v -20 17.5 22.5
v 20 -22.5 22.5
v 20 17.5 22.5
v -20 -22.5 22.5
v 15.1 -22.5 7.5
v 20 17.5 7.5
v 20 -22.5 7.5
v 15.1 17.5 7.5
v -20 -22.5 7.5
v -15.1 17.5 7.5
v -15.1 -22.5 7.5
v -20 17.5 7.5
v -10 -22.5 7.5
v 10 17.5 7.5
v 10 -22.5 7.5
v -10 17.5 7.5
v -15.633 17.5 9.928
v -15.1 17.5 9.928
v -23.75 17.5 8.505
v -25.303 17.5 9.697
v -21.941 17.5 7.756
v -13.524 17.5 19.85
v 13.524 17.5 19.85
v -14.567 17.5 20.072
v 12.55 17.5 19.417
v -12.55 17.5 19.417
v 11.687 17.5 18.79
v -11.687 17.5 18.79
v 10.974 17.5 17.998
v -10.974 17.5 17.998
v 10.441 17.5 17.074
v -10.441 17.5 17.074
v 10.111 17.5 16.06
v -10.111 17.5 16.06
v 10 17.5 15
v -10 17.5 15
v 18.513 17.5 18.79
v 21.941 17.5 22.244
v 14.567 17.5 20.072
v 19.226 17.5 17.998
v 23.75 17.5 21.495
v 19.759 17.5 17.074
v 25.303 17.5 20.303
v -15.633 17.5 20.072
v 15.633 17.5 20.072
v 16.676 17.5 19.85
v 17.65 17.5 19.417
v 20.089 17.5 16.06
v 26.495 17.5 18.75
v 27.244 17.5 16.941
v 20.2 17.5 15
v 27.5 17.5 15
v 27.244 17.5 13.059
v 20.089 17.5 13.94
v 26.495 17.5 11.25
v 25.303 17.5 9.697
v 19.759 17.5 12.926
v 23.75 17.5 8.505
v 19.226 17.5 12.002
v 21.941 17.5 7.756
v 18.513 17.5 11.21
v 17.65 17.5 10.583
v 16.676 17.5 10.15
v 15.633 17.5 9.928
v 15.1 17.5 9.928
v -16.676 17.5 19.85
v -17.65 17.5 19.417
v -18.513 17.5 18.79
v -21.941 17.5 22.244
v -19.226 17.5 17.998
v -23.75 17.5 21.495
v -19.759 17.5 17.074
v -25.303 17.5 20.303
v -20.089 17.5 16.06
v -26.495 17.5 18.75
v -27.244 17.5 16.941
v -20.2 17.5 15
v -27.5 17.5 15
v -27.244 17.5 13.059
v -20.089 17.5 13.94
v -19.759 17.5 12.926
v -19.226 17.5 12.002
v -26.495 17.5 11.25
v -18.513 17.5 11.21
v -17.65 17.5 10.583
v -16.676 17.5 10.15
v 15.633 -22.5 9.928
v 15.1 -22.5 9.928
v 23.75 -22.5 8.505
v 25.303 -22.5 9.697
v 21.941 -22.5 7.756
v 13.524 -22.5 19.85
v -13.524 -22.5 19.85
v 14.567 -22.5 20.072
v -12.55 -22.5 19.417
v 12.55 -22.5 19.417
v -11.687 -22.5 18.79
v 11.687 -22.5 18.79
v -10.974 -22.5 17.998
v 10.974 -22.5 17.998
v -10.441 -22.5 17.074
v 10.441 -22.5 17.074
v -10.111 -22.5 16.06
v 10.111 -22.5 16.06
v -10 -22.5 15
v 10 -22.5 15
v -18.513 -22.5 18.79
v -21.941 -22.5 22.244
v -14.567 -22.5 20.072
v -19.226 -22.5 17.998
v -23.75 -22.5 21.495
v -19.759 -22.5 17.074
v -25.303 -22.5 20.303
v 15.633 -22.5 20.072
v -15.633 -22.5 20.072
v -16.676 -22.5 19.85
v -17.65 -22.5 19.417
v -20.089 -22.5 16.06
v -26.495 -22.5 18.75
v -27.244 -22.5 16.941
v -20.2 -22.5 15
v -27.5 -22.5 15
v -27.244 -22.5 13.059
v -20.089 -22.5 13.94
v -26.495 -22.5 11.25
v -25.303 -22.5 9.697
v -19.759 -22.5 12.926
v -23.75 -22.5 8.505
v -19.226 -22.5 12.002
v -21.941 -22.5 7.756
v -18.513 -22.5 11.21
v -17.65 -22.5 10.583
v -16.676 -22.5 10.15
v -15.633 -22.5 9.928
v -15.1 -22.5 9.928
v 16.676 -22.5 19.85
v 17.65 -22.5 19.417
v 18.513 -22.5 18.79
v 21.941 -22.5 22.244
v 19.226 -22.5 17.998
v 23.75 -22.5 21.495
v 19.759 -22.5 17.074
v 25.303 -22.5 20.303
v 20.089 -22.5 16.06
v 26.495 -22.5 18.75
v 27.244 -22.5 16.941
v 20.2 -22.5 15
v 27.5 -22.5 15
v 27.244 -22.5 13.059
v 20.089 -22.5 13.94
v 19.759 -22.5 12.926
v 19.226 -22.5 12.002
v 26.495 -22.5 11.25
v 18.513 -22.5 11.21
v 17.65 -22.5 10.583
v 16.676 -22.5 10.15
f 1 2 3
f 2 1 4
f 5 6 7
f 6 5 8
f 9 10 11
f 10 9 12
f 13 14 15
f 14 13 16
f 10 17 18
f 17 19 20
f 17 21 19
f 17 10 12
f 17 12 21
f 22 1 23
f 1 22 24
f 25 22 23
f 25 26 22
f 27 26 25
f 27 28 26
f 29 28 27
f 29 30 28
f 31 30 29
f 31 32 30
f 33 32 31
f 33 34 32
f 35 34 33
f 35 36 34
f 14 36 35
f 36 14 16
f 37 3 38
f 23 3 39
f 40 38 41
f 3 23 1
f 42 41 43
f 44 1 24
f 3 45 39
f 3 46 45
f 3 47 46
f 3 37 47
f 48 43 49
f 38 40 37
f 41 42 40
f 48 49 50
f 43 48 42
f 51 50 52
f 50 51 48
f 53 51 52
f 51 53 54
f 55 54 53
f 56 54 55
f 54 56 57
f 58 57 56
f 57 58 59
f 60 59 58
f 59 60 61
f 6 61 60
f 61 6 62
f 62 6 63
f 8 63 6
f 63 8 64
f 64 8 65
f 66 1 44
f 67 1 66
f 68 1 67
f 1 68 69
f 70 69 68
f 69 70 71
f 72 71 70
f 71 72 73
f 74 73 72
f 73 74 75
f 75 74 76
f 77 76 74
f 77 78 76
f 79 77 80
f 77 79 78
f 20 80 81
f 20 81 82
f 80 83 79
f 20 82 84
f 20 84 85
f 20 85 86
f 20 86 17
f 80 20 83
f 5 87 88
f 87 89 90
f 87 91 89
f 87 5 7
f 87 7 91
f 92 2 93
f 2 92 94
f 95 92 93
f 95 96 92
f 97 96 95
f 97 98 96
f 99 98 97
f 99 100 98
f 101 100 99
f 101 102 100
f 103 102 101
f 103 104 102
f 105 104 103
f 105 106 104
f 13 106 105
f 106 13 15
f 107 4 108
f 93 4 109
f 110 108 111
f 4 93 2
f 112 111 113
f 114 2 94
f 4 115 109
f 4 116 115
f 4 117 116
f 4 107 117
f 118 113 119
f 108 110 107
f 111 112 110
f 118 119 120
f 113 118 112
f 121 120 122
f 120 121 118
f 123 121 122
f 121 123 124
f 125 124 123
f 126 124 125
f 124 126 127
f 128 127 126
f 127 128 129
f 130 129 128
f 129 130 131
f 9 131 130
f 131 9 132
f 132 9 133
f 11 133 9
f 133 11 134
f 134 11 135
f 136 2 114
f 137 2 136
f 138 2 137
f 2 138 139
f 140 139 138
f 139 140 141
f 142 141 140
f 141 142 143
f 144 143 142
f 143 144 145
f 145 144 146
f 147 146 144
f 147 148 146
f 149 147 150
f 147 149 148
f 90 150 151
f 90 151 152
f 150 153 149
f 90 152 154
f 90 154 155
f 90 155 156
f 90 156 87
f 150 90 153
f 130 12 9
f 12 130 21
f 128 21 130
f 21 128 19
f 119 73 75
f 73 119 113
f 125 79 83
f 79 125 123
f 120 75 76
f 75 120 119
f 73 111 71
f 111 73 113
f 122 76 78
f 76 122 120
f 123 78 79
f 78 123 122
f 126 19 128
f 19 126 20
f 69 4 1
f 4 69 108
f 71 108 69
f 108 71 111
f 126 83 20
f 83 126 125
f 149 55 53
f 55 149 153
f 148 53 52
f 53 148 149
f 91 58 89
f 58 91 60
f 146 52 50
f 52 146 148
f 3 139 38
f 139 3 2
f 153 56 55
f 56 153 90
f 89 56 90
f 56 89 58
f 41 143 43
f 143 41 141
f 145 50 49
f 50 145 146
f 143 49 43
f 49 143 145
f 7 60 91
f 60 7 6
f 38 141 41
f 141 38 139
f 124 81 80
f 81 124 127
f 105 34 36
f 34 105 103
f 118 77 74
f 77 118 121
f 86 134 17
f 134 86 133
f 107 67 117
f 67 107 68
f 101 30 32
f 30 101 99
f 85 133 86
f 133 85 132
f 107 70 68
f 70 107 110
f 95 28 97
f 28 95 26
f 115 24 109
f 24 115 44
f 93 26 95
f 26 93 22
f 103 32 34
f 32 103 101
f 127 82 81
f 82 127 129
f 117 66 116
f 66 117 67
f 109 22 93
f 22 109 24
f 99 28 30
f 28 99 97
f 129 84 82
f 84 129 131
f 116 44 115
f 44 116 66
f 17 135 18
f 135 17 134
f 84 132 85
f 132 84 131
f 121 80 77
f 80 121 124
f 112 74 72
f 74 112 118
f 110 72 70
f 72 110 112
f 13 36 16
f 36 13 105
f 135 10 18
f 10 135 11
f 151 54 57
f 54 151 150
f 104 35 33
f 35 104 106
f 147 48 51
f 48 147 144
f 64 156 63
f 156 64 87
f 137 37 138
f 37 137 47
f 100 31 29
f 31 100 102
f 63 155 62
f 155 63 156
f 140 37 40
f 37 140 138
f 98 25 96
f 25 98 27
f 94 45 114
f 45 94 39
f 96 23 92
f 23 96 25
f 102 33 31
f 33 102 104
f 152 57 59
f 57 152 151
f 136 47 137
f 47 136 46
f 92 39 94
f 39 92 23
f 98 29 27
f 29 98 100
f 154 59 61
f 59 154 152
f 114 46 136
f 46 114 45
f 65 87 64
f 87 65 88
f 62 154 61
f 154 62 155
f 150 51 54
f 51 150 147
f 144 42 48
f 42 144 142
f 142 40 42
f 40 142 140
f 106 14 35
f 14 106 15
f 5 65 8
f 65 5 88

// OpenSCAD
module manfrotto_stand() {
	import("D:/Tools/3D/_projects_/Negative_Scanner/parts/part_manfrotto_stand.stl");
}

module cam_stand_base() {
	difference() {
		translate([-35,-32.5,0]) {
			cube([70,65,50]);
		}
		translate([-30,-27.5,10]) {
			cube([60,55,70]);
		}
	}
	translate([0,0,50]) {
		
			base_tongue(0.05);
	}
	translate([0,27.5,0]) {
		scanner_rail();
	}
}

module base_tongue(offset = 0) {
	translate([-37.5,-35,-0]) {
		translate([2.5,2.5,0]) {
			cube([70,2.5 - offset,2.6]);
		}
		translate([2.5,2.5,0]) {
			cube([2.5 - offset,65,2.6]);
		}
		translate([2.5,65,0]) {
			cube([70,2.5 - offset,2.6]);
		}
		translate([70,2.5,0]) {
			cube([2.5,65-offset,2.6]);
		}
	}
}

module cam_stand_top() {
	difference() {
		manfrotto_stand();
		base_tongue();
	}
	translate([-15,-30,-11]) {
		cube([30,5,11]);
	}
}

module rail_part(offset=0) {
	translate([-5-offset,0.5,15]) {
		rotate([90,0,0]) {
			cylinder(1,5 + offset,5 + offset,$fd=1,$fs=0.1);
		}

	}
	translate([-5-offset,-0.5,0]) {
		cube([5 + offset,1,15]);
	}
}

module rail(length, offset=0) {
	scale([1,length,1]) {
		translate([-10,0,0]) {
			rail_part(offset);
		}
		translate([10,0,0]) {
			mirror() rail_part(offset);
		}
	}
}

module scanner_rail() {
	translate([0,75,0]) {
		rail(150);
	}
	translate([-15,0,0]) {
		cube([30,5,5]);
	}
	translate([-15,145,0]) {
		cube([30,5,5]);
	}
	translate([-15,72.5,0]) {
		cube([30,5,5]);
	}
	translate([-15,34.05,0]) {
		cube([30,5,5]);
	}
	translate([-15,106.55,0]) {
		cube([30,5,5]);
	}
}

module scanner_rail_runner() {
	translate([0,10,0]) {
		difference() {
			union() {
				translate([-20,-32.5,7.5]) {
					cube([40,40,15]);
				}
				translate([-20,7.5,15]) {
					rotate([90,0,0]) {
						cylinder(40,7.5,7.5);
					}
				}
				mirror() {
					translate([-20,7.5,15]) {
						rotate([90,0,0]) {
							cylinder(40,7.5,7.5);
						}
					}
				}
			}
			rail(90,0.1);
		}
	}
}

//cam_stand_base();
//cam_stand_top();

scanner_rail_runner();
